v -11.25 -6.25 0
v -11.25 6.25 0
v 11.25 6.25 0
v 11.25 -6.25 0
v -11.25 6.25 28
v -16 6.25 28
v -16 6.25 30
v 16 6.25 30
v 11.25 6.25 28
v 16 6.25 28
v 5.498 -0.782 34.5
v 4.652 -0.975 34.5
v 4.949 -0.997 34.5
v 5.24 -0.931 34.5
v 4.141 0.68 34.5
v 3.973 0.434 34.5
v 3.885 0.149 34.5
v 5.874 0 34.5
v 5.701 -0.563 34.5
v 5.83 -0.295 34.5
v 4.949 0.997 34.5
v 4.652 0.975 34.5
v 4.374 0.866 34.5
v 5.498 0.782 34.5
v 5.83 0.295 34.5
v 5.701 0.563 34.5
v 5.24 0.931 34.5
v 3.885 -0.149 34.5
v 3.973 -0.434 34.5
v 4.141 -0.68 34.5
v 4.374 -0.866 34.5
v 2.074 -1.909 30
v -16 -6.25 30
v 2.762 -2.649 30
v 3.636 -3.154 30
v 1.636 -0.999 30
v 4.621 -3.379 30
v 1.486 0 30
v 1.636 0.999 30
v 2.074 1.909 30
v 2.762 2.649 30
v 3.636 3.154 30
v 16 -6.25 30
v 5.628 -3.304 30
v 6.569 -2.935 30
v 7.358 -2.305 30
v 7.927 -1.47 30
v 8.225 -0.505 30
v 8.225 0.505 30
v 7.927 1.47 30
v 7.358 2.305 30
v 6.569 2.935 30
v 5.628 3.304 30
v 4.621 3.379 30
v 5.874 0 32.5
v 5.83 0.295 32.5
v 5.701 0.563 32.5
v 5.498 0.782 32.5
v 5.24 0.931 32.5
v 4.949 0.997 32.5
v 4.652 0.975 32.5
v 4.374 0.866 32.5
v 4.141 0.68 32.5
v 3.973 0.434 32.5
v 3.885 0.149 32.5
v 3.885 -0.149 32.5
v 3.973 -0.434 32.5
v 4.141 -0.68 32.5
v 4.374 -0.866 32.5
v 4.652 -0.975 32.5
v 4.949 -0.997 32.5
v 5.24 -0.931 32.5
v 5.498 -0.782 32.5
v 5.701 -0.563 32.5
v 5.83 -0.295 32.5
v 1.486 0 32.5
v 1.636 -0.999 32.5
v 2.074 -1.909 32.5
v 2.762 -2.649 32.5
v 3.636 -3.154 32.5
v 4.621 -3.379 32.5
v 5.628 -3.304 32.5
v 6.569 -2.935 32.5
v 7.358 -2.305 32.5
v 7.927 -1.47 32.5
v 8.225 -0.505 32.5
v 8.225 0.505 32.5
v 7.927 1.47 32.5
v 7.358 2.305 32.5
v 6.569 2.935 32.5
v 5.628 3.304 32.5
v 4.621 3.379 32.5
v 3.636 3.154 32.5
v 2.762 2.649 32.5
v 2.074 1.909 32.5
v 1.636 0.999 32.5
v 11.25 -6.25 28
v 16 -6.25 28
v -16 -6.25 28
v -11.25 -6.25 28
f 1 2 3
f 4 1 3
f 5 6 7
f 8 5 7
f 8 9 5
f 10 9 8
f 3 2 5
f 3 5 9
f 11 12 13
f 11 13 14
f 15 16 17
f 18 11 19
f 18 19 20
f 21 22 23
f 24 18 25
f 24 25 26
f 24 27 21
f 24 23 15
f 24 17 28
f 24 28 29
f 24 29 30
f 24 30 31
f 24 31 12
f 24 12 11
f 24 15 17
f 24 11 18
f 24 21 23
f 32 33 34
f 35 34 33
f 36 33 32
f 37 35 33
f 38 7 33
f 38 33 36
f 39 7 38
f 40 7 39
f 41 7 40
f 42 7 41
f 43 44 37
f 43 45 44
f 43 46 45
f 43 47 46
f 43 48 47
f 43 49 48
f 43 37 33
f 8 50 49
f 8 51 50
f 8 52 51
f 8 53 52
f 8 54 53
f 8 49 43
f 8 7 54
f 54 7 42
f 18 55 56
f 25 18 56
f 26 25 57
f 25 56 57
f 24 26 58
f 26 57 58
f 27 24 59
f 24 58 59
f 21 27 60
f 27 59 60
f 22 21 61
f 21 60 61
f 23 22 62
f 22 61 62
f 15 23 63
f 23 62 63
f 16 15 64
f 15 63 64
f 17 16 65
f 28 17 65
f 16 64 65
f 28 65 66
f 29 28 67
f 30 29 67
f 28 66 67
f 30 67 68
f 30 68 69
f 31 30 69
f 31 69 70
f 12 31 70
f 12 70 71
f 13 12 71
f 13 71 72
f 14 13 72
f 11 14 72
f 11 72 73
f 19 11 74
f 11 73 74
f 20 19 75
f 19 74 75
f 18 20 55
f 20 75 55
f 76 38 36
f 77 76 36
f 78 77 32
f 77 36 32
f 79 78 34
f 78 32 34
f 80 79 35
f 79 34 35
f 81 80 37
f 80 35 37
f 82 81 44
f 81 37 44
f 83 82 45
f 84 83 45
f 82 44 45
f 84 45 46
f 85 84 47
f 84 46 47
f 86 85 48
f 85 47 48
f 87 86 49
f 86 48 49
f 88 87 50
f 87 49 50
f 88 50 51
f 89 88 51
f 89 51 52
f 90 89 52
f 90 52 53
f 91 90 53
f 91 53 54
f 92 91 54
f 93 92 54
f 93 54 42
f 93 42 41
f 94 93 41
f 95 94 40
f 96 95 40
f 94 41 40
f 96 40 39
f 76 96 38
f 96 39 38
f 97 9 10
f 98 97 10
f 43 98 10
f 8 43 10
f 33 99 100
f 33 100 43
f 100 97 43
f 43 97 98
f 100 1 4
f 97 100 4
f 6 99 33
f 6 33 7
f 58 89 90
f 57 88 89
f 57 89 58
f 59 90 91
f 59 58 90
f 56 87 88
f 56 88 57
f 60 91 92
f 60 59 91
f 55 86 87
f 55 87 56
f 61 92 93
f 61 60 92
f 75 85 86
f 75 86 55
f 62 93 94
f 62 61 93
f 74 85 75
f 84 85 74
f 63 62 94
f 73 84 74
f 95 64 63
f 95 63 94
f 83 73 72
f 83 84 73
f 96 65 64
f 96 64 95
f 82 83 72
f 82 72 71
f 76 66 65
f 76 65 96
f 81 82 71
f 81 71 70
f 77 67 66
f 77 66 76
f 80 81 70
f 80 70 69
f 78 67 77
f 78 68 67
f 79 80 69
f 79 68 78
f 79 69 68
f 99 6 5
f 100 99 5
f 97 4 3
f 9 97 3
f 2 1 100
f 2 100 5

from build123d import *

# Parameters (mm, degrees)
SKETCH_1_W      = 22.5
SKETCH_1_H      = 12.5
EXTRUDE_1_DEPTH = 28
SKETCH_2_W      = 32
SKETCH_2_H      = 12.5
EXTRUDE_2_DEPTH = 2
SKETCH_3_R      = 3.388656212
EXTRUDE_3_DEPTH = 2.5
SKETCH_4_R      = 1
EXTRUDE_4_DEPTH = 2


with BuildPart() as part:
    # 草图1 → 凸台-拉伸1 (new body)
    with BuildSketch(Plane.XY):
        Rectangle(SKETCH_1_W, SKETCH_1_H)
    extrude(amount=EXTRUDE_1_DEPTH)

    # 草图2 → 凸台-拉伸2 (add)
    with BuildSketch(Plane.XY.offset(28)):
        Rectangle(SKETCH_2_W, SKETCH_2_H)
    extrude(amount=EXTRUDE_2_DEPTH)

    # 草图3 → 凸台-拉伸3 (add)
    with BuildSketch(Plane.XY.offset(30)):
        with Locations(Location((4.874315739, 0, 0), (0, 0, 180))):
            Circle(SKETCH_3_R)
    extrude(amount=EXTRUDE_3_DEPTH)

    # 草图4 → 凸台-拉伸4 (add)
    with BuildSketch(Plane.XY.offset(32.5)):
        with Locations((4.874315739, 0)):
            Circle(SKETCH_4_R)
    extrude(amount=EXTRUDE_4_DEPTH)


solid = part.part
